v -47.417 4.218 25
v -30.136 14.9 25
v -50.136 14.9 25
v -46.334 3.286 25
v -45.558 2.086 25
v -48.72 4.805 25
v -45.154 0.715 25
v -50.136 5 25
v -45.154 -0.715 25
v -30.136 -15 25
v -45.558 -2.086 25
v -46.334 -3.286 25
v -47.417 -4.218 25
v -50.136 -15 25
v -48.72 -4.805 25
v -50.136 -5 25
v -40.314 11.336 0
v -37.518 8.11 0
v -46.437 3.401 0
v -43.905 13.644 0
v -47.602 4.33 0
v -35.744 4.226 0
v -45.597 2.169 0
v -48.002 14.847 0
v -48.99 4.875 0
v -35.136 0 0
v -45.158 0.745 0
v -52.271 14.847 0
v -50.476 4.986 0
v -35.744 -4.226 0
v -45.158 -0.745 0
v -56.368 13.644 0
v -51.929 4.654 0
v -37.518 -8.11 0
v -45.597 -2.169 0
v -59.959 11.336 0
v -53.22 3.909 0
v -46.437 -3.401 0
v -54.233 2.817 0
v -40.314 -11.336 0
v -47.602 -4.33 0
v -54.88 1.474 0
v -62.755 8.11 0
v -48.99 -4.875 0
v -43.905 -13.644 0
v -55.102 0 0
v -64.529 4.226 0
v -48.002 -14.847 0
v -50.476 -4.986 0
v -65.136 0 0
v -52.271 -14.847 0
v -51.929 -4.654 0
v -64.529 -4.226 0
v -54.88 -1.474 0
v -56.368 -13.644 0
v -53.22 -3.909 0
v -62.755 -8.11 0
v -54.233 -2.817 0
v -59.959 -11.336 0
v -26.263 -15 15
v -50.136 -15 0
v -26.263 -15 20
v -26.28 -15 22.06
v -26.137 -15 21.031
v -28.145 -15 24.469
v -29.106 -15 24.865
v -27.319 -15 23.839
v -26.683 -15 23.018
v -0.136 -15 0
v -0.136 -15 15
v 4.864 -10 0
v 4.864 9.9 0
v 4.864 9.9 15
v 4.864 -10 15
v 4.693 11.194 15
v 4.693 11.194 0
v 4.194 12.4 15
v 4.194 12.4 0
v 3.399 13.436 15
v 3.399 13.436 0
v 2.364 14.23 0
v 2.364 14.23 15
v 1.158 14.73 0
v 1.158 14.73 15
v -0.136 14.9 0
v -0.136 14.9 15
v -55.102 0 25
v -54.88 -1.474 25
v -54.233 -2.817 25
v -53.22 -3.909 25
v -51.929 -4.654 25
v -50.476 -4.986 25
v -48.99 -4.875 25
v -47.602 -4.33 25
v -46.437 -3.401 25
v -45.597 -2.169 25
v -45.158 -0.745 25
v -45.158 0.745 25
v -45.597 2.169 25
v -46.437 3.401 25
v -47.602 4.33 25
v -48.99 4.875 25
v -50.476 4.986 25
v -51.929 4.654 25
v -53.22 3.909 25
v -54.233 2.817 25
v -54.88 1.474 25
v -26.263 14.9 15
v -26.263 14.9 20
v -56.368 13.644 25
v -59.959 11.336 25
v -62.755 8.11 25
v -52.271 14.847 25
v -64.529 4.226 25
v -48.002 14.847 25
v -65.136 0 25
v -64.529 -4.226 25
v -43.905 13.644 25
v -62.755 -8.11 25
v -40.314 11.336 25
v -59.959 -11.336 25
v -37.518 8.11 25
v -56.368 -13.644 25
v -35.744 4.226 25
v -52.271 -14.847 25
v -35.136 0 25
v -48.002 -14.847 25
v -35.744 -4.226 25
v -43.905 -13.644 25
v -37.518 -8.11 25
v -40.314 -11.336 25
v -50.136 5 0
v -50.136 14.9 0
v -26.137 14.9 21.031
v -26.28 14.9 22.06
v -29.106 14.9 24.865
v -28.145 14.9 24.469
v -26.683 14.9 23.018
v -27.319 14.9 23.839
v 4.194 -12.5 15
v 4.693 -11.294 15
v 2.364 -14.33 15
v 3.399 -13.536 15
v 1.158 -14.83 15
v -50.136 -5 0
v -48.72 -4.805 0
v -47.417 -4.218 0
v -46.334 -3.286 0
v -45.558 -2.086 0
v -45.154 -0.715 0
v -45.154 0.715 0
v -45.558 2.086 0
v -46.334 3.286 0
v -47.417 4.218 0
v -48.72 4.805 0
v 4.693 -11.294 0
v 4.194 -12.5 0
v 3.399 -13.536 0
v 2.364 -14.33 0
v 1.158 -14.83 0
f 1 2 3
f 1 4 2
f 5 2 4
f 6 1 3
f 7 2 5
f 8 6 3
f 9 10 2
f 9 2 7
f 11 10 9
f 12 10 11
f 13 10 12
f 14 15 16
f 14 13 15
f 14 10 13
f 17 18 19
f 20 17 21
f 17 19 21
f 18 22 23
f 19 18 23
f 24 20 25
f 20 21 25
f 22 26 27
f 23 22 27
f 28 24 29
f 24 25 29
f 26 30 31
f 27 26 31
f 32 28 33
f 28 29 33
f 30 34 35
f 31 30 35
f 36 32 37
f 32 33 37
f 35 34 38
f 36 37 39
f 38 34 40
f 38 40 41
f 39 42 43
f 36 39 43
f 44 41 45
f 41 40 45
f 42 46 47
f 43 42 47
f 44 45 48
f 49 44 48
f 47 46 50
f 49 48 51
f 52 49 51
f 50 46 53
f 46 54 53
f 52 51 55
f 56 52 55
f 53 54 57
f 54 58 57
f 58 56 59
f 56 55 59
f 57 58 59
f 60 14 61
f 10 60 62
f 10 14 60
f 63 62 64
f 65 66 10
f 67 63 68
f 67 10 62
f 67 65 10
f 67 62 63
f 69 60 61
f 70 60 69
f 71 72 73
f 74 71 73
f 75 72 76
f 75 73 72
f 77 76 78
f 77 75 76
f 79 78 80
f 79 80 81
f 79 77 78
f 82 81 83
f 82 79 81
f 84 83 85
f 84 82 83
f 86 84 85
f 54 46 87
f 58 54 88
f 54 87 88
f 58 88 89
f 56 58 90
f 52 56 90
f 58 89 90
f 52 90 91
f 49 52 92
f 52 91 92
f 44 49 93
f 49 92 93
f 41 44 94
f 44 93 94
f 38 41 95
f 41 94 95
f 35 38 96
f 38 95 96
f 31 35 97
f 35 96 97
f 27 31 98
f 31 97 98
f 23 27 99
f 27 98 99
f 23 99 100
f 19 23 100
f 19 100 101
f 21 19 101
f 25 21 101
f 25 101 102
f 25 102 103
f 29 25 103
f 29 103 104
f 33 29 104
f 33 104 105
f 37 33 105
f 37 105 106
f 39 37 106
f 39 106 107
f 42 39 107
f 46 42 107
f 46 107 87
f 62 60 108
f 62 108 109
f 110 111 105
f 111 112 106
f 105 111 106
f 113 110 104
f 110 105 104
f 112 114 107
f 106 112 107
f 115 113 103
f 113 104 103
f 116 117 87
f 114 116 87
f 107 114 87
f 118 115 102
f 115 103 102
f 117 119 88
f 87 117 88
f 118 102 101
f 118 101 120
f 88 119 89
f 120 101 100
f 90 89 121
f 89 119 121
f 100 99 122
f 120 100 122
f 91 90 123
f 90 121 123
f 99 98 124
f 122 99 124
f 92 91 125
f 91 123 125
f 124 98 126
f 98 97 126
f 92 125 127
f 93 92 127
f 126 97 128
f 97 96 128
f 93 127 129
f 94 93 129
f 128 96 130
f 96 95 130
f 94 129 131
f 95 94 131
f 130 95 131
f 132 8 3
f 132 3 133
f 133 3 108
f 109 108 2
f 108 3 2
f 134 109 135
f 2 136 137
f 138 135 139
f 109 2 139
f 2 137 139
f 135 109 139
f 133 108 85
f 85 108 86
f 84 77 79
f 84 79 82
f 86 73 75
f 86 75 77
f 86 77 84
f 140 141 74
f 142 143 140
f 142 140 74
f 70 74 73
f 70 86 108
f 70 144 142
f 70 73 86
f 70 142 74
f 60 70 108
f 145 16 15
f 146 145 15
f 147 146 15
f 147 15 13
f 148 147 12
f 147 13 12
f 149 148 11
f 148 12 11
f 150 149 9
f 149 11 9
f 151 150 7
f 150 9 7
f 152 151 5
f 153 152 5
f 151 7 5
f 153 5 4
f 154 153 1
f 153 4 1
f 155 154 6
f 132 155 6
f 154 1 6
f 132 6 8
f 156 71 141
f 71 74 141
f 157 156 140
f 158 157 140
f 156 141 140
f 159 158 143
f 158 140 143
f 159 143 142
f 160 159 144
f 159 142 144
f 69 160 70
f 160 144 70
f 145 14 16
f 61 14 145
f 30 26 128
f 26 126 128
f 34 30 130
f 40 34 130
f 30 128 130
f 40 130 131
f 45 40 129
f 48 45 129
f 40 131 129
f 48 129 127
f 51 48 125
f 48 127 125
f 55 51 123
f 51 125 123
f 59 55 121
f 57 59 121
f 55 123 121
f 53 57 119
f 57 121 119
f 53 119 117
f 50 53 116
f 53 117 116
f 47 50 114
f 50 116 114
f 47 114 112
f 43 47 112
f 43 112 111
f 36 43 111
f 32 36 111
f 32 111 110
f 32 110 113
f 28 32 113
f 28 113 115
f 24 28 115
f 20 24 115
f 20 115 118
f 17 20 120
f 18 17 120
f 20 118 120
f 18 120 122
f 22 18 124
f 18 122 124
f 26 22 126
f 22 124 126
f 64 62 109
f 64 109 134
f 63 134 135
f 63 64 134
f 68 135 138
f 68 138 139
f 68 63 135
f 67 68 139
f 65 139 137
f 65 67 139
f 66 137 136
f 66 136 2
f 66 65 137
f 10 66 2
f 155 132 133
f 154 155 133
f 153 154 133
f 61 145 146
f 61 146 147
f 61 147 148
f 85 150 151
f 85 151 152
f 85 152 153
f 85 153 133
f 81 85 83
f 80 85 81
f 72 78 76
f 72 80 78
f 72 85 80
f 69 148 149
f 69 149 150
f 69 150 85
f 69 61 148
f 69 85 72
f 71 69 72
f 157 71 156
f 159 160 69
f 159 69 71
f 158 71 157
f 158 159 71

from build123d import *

# Parameters (mm, degrees)
F2_DEPTH      = 15
F2_DEPTH_BACK = 14.9
F4_D          = 10
F4_2_D        = 10
F5_R          = 5


with BuildPart() as f1:
    # F0 (on Front) → F1 (revolve)
    with BuildSketch(Plane.XZ):
        Polygon((-35.136436, 0), (-35.136436, 15), (-35.136436, 25), (-50.136436, 25), (-50.136436, 0), align=None)
    revolve(axis=Axis((-50.136436, 0, 12.5), (0, 0, -1)))

    # F4 (through all)
    with Locations(Plane(origin=(0, 0, 0), x_dir=(1, 0, 0), z_dir=(0, 0, -1))):
        with Locations((-50.102301, 0)):
            Hole(F4_D / 2)


with BuildPart() as f2:
    # F0 (on Front) → F2 (new body, two sides)
    with BuildSketch(Plane.XZ) as f2_sk:
        Polygon((-26.263453, 15), (-35.136436, 15), (-35.136436, 0), (4.863564, 0), (4.863564, 15), align=None)
        with BuildLine():
            Line((-35.136436, 25), (-35.136436, 15))
            Line((-35.136436, 15), (-26.263453, 15))
            Line((-26.263453, 15), (-26.263453, 20))
            ThreePointArc((-26.263453, 20), (-26.974158, 23.44949), (-30.136436, 25))
            Line((-30.136436, 25), (-35.136436, 25))
        make_face()
        Polygon((-35.136436, 0), (-35.136436, 15), (-35.136436, 25), (-50.136436, 25), (-50.136436, 0), align=None)
    extrude(amount=F2_DEPTH)
    extrude(f2_sk.sketch, amount=-F2_DEPTH_BACK)

    # F4#2 (through all)
    with Locations(Plane(origin=(0, 0, 0), x_dir=(1, 0, 0), z_dir=(0, 0, -1))):
        with Locations((-50.102301, 0)):
            Hole(F4_2_D / 2)

    # F5
    f5_edges = [f2.edges().sort_by_distance(p)[0] for p in [
        (4.863564, 14.9, 7.5),
        (4.863564, -15, 7.5),
    ]]
    fillet(f5_edges, radius=F5_R)


solid = Compound([f1.part, f2.part])
